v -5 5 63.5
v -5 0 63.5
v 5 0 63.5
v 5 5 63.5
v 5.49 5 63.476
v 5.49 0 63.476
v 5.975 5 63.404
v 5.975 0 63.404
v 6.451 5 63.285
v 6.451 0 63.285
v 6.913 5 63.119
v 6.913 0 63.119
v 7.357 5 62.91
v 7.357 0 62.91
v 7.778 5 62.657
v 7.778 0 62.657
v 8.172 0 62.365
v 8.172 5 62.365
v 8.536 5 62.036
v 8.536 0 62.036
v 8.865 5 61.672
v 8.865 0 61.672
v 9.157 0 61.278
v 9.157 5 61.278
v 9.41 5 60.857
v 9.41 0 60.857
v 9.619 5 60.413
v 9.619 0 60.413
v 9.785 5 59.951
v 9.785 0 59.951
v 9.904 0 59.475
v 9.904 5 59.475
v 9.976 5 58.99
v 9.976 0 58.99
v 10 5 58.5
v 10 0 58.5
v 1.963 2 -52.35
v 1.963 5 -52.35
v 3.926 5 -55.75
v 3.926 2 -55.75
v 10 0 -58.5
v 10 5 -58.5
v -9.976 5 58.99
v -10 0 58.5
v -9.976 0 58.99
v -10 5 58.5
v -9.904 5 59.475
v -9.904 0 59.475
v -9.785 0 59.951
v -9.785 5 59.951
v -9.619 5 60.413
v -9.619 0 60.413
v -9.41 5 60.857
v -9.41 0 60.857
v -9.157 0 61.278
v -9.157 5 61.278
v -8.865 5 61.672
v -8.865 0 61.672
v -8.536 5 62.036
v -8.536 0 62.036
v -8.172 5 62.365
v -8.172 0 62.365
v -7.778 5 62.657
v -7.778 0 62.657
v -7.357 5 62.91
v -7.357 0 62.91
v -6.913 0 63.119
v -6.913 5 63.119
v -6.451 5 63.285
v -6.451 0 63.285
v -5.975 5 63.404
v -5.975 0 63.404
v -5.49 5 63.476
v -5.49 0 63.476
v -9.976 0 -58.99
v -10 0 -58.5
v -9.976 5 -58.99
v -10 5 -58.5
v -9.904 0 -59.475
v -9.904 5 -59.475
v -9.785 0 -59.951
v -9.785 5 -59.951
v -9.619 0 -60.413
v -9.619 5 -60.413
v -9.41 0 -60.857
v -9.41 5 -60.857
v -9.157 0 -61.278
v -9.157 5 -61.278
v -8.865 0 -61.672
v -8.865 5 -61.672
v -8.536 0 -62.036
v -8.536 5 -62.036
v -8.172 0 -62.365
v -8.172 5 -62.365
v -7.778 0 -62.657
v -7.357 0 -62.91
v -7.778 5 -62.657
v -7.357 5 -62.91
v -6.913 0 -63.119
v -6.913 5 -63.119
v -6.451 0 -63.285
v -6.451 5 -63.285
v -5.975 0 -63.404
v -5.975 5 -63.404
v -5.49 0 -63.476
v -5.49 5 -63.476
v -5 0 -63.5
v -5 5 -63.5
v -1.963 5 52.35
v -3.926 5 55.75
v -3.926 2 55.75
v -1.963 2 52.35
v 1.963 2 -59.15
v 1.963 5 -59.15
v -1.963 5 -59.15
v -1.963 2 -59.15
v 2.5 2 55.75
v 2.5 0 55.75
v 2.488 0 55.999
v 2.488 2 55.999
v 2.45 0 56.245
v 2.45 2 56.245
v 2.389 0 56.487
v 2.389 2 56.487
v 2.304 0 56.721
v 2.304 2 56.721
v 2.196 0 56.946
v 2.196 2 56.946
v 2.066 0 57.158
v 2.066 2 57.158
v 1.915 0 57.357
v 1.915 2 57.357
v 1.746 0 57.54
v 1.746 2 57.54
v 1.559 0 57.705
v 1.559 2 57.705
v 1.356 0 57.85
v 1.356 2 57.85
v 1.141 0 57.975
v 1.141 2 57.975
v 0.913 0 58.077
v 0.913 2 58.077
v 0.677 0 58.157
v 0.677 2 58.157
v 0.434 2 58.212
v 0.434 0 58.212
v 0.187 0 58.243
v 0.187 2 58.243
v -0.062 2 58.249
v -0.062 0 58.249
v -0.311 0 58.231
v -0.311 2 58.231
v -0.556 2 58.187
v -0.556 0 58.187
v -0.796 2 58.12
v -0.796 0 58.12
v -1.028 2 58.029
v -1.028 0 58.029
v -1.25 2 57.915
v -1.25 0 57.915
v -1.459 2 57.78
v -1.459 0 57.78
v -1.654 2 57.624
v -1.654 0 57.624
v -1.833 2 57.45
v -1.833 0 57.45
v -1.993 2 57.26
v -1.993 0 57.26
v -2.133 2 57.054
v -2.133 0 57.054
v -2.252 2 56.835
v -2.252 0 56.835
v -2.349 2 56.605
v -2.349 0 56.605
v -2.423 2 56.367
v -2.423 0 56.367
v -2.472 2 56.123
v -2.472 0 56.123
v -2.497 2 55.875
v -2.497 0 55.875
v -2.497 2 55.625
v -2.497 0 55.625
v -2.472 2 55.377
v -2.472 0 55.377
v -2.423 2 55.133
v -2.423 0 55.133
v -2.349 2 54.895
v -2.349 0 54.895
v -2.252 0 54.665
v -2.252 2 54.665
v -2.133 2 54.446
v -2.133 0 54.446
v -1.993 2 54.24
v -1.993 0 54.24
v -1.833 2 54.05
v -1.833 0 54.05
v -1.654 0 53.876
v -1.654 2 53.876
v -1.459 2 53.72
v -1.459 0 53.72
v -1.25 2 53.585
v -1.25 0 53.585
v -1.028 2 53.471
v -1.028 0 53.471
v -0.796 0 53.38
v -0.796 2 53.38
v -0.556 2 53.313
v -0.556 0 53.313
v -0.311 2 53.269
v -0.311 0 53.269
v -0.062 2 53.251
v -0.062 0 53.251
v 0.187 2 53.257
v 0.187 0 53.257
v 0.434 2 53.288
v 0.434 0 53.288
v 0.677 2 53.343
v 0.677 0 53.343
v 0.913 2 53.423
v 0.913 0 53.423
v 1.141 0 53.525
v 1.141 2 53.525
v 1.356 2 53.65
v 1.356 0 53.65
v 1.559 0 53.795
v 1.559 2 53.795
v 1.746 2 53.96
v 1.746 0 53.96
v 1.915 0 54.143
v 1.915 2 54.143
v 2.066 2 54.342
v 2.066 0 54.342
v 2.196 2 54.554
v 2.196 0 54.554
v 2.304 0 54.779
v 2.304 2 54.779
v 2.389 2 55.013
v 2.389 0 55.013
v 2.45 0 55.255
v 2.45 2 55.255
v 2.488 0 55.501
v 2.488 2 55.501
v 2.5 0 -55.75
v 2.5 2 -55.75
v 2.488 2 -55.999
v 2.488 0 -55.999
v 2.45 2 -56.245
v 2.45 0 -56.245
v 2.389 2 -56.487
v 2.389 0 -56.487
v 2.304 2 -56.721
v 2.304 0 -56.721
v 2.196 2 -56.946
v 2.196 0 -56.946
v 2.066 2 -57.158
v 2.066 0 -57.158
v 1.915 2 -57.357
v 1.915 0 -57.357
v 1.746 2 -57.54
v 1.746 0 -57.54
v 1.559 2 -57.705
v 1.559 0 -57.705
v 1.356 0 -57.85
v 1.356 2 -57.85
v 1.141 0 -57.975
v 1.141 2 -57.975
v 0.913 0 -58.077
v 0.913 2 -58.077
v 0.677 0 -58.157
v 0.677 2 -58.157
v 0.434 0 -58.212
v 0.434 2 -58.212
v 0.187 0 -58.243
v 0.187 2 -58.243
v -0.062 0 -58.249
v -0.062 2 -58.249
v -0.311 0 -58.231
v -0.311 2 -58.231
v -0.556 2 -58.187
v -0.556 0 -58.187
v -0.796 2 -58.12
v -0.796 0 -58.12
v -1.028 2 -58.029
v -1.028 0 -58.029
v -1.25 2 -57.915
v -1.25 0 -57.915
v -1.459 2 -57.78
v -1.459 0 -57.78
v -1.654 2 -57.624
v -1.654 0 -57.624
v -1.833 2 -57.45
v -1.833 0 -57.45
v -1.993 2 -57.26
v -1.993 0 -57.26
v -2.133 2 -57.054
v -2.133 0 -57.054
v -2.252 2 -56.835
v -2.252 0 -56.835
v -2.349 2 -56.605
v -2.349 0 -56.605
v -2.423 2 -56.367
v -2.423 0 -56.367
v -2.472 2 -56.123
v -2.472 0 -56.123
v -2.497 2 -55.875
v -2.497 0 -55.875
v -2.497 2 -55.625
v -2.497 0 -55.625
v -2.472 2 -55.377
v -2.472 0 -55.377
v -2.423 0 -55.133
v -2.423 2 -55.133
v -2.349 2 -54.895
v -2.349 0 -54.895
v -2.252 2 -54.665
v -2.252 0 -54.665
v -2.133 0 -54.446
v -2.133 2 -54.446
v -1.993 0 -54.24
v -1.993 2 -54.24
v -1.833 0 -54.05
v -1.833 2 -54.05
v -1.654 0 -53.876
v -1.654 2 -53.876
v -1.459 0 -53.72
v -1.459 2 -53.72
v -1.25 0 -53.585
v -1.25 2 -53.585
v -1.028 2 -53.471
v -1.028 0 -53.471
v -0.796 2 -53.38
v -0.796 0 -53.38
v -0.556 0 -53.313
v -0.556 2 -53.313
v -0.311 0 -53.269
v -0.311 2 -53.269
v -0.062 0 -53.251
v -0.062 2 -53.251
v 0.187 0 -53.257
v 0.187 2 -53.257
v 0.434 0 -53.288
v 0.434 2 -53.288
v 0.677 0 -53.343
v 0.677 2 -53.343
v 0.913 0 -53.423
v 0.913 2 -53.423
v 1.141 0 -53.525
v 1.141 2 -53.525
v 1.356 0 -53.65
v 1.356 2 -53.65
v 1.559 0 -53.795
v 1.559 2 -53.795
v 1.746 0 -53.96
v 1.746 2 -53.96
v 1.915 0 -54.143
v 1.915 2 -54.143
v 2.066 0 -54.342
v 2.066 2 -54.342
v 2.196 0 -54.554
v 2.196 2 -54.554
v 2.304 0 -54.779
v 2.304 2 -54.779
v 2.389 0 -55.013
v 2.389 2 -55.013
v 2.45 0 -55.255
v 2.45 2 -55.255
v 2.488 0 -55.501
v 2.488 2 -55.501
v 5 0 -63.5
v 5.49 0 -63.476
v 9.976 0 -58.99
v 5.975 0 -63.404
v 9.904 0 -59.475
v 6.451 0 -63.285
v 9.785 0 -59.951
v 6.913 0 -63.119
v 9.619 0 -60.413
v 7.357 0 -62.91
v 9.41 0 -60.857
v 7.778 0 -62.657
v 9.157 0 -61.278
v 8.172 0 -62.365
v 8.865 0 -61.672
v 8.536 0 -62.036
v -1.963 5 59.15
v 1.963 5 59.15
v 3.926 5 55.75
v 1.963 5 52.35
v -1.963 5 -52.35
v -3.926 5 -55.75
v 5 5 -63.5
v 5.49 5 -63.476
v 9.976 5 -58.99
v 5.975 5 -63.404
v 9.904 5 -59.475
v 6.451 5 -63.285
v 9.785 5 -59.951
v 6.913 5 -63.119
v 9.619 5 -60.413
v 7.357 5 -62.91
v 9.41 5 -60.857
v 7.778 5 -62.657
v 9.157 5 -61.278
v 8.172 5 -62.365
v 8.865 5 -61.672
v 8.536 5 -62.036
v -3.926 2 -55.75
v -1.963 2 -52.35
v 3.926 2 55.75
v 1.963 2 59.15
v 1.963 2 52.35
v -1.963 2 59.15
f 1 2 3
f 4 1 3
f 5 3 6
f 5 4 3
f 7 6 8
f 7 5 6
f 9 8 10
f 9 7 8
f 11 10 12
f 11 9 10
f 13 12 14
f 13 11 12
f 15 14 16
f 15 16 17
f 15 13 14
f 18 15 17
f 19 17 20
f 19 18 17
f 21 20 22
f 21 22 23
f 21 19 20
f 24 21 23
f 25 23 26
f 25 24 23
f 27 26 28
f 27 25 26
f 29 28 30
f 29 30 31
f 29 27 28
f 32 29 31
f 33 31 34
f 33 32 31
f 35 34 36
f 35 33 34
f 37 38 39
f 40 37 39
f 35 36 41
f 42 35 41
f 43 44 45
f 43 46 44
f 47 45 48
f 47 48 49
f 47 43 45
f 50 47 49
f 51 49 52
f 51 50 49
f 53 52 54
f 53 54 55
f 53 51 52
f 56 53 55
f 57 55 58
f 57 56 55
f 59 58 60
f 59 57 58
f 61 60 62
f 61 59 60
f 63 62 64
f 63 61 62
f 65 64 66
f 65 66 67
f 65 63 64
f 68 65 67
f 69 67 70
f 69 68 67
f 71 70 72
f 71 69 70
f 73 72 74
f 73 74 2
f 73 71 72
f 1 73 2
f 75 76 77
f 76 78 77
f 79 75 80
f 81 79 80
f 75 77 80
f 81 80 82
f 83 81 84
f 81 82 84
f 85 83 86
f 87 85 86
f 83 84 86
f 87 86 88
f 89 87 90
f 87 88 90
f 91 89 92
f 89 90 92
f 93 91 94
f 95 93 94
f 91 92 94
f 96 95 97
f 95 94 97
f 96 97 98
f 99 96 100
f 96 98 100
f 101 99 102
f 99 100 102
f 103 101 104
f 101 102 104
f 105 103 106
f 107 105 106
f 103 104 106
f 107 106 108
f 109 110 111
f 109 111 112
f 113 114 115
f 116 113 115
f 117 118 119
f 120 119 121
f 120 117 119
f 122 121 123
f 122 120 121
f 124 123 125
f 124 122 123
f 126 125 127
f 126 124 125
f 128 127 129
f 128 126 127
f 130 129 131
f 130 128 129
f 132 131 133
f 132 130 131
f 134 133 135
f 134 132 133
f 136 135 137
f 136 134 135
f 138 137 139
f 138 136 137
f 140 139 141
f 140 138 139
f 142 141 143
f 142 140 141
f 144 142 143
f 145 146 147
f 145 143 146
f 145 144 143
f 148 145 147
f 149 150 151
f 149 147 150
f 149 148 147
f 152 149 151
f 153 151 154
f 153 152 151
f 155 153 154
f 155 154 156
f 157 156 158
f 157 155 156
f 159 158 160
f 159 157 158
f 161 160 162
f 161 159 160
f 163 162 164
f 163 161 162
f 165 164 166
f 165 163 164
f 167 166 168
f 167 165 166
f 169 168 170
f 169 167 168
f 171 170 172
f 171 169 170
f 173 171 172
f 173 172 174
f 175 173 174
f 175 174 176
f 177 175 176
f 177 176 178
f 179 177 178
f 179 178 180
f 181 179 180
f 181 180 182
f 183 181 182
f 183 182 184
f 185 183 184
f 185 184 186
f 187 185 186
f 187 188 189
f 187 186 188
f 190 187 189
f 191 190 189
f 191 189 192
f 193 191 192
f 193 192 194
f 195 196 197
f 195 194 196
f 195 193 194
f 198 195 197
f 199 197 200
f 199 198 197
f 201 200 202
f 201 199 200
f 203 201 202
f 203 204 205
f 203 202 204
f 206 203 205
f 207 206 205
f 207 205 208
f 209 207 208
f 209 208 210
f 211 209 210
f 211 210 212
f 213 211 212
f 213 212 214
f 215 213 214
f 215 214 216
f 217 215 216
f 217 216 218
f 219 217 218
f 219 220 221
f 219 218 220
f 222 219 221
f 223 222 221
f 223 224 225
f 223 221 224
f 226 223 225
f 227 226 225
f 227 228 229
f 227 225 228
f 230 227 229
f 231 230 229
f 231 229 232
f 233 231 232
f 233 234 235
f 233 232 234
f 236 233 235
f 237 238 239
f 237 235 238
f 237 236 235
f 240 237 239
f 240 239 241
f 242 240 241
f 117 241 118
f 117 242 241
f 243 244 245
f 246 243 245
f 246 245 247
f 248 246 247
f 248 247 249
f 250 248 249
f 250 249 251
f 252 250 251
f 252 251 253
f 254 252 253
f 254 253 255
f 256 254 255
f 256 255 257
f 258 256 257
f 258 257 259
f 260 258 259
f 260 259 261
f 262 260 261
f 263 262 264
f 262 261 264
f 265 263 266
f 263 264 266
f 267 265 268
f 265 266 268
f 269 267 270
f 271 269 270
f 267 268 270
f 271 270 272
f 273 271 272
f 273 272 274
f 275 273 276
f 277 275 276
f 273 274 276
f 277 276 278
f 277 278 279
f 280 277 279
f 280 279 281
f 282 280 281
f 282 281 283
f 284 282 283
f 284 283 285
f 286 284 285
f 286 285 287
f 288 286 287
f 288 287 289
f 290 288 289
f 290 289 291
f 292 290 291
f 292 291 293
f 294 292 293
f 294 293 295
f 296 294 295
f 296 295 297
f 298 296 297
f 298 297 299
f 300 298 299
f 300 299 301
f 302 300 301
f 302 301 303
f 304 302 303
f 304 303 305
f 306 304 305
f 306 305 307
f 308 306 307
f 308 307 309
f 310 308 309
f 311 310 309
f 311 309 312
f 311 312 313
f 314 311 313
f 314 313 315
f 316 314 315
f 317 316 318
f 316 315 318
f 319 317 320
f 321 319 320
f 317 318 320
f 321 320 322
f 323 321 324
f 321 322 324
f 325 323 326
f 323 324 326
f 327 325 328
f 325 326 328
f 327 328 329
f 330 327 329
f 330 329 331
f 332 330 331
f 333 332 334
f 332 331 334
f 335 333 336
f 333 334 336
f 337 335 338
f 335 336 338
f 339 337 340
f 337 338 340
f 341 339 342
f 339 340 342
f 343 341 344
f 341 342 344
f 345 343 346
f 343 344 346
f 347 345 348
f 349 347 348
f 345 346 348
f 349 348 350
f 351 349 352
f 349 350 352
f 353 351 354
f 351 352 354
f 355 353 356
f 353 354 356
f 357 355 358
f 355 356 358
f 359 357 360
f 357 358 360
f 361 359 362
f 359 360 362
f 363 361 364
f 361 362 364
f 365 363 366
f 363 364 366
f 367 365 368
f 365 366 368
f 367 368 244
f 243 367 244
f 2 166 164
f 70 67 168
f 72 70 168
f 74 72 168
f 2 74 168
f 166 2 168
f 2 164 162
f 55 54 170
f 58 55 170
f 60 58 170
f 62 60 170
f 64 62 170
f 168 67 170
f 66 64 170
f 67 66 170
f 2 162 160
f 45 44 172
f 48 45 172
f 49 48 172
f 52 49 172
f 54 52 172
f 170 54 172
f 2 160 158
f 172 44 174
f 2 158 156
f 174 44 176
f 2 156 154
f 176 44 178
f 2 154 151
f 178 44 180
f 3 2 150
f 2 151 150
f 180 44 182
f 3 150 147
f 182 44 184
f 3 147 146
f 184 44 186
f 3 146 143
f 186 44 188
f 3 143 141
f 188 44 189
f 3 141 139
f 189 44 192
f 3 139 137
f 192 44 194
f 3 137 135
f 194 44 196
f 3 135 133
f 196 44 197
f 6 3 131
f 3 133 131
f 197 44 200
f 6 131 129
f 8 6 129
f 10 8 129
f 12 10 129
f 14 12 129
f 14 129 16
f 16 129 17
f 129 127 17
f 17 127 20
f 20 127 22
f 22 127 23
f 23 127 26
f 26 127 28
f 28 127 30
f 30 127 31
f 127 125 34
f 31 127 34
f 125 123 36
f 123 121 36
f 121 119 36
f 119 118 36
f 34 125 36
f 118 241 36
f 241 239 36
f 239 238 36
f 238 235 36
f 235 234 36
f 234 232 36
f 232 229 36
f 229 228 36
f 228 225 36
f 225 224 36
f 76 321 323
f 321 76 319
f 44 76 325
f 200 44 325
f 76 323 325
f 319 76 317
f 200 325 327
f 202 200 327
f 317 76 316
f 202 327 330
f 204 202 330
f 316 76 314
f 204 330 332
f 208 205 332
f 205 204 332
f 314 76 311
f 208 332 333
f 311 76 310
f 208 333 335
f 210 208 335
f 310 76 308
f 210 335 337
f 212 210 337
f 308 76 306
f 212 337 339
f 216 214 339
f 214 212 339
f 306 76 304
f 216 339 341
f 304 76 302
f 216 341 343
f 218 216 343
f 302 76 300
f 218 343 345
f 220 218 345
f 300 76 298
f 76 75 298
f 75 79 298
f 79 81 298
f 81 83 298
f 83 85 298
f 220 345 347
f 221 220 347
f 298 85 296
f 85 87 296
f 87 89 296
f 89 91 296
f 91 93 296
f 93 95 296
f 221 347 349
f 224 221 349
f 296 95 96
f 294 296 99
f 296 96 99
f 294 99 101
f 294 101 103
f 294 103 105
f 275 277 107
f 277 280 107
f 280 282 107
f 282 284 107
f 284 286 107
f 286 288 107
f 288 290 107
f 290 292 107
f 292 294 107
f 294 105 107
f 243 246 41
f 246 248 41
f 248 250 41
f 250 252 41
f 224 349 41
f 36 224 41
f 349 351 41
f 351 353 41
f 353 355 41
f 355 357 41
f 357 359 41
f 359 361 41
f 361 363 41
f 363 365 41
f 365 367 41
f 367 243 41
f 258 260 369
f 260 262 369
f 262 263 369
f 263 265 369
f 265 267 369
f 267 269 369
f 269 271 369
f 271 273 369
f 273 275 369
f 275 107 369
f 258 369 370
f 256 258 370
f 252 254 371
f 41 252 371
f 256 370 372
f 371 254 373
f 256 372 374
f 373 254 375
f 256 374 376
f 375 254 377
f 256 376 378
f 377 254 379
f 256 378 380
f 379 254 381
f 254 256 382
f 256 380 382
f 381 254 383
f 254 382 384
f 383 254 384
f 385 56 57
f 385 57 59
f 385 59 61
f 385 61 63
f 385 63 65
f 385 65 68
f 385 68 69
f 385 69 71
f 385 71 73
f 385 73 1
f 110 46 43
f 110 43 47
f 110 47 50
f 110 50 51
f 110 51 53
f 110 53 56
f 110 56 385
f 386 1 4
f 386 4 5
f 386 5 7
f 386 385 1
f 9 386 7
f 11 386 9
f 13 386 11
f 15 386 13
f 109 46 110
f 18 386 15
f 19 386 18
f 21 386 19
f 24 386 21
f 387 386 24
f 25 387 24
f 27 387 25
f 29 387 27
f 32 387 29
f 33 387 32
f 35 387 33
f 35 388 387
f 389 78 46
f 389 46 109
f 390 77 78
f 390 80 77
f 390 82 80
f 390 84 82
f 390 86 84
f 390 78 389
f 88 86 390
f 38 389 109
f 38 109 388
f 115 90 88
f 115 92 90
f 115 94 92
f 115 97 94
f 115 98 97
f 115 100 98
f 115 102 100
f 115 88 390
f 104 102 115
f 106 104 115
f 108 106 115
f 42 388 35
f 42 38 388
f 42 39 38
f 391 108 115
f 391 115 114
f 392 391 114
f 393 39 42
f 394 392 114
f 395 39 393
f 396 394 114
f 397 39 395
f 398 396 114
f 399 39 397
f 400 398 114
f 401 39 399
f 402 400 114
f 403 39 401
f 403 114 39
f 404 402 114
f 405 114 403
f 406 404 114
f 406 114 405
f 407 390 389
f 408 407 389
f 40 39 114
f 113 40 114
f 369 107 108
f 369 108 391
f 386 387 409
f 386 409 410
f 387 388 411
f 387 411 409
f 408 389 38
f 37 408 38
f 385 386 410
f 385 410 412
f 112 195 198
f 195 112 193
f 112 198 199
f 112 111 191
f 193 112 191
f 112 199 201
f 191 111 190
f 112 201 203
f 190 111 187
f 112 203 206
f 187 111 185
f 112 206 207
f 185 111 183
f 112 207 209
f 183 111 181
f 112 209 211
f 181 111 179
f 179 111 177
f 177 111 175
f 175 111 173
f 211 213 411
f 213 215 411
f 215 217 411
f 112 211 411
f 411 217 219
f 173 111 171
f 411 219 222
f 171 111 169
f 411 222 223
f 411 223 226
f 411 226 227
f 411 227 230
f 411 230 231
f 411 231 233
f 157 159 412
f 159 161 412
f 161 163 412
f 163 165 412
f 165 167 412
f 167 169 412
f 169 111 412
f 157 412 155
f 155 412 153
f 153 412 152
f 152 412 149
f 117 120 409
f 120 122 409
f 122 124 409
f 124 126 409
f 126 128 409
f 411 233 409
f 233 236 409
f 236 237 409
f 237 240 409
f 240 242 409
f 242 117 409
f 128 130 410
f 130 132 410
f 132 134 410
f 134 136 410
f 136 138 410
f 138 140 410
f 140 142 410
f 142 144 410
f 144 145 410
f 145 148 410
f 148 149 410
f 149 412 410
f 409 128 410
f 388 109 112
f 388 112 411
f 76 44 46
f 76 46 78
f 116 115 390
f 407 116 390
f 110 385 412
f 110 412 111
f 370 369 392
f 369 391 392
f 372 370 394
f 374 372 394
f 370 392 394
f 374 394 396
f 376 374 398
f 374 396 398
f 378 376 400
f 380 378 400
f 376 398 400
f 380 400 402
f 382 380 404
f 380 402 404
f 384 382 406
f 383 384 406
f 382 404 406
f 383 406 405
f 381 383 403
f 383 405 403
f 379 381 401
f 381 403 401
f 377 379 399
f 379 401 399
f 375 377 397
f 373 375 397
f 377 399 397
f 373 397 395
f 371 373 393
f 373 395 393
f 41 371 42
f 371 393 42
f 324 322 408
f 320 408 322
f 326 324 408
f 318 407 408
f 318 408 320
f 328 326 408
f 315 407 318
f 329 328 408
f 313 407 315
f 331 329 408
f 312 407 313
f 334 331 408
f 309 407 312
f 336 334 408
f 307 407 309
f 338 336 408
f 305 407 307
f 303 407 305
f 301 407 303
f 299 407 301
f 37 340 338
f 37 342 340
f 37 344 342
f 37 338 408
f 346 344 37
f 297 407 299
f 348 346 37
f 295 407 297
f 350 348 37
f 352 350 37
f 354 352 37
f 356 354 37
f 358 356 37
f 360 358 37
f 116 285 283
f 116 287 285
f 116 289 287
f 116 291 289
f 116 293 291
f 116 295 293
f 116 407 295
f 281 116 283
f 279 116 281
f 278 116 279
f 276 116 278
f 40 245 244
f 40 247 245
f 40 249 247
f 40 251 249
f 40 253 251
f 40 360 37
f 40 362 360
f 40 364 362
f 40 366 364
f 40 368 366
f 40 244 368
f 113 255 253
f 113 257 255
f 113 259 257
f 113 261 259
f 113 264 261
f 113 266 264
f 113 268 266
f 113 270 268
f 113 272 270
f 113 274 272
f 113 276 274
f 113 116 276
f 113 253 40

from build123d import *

# Parameters (mm, degrees)
SKETCH1_W           = 20
SKETCH1_H           = 127
BOSS_EXTRUDE1_DEPTH = 5
CUT_EXTRUDE1_DEPTH  = 3
SKETCH4_R           = 2.5
CUT_EXTRUDE2_DEPTH  = 3
FILLET1_R           = 5


with BuildPart() as part:
    # Sketch1 → Boss-Extrude1 (new body)
    with BuildSketch(Plane(origin=(0, 0, 0), x_dir=(1, 0, 0), z_dir=(0, 1, 0))):
        Rectangle(SKETCH1_W, SKETCH1_H)
    extrude(amount=BOSS_EXTRUDE1_DEPTH)

    # Sketch3 → Cut-Extrude1 (cut)
    with BuildSketch(Plane(origin=(0, 5, 0), x_dir=(1, 0, 0), z_dir=(0, 1, 0))):
        Polygon((3.92598183, 55.75), (1.962990915, 59.15), (-1.962990915, 59.15), (-3.92598183, 55.75), (-1.962990915, 52.35), (1.962990915, 52.35), align=None)
    cut_extrude1 = extrude(amount=-CUT_EXTRUDE1_DEPTH, mode=Mode.SUBTRACT)

    # Sketch4 → Cut-Extrude2 (cut, through all)
    with BuildSketch(Plane(origin=(0, 2, 0), x_dir=(1, 0, 0), z_dir=(0, 1, 0))):
        with Locations((0, 55.75)):
            Circle(SKETCH4_R)
    cut_extrude2 = extrude(amount=-CUT_EXTRUDE2_DEPTH, mode=Mode.SUBTRACT)

    # Mirror1: Cut-Extrude1, Cut-Extrude2 across plane
    add(cut_extrude1.mirror(Plane.XY), mode=Mode.SUBTRACT)
    add(cut_extrude2.mirror(Plane.XY), mode=Mode.SUBTRACT)

    # Fillet1
    fillet1_edges = [part.edges().sort_by_distance(p)[0] for p in [
        (10, 2.5, 63.5),
        (-10, 2.5, 63.5),
        (-10, 2.5, -63.5),
        (10, 2.5, -63.5),
    ]]
    fillet(fillet1_edges, radius=FILLET1_R)


solid = part.part
